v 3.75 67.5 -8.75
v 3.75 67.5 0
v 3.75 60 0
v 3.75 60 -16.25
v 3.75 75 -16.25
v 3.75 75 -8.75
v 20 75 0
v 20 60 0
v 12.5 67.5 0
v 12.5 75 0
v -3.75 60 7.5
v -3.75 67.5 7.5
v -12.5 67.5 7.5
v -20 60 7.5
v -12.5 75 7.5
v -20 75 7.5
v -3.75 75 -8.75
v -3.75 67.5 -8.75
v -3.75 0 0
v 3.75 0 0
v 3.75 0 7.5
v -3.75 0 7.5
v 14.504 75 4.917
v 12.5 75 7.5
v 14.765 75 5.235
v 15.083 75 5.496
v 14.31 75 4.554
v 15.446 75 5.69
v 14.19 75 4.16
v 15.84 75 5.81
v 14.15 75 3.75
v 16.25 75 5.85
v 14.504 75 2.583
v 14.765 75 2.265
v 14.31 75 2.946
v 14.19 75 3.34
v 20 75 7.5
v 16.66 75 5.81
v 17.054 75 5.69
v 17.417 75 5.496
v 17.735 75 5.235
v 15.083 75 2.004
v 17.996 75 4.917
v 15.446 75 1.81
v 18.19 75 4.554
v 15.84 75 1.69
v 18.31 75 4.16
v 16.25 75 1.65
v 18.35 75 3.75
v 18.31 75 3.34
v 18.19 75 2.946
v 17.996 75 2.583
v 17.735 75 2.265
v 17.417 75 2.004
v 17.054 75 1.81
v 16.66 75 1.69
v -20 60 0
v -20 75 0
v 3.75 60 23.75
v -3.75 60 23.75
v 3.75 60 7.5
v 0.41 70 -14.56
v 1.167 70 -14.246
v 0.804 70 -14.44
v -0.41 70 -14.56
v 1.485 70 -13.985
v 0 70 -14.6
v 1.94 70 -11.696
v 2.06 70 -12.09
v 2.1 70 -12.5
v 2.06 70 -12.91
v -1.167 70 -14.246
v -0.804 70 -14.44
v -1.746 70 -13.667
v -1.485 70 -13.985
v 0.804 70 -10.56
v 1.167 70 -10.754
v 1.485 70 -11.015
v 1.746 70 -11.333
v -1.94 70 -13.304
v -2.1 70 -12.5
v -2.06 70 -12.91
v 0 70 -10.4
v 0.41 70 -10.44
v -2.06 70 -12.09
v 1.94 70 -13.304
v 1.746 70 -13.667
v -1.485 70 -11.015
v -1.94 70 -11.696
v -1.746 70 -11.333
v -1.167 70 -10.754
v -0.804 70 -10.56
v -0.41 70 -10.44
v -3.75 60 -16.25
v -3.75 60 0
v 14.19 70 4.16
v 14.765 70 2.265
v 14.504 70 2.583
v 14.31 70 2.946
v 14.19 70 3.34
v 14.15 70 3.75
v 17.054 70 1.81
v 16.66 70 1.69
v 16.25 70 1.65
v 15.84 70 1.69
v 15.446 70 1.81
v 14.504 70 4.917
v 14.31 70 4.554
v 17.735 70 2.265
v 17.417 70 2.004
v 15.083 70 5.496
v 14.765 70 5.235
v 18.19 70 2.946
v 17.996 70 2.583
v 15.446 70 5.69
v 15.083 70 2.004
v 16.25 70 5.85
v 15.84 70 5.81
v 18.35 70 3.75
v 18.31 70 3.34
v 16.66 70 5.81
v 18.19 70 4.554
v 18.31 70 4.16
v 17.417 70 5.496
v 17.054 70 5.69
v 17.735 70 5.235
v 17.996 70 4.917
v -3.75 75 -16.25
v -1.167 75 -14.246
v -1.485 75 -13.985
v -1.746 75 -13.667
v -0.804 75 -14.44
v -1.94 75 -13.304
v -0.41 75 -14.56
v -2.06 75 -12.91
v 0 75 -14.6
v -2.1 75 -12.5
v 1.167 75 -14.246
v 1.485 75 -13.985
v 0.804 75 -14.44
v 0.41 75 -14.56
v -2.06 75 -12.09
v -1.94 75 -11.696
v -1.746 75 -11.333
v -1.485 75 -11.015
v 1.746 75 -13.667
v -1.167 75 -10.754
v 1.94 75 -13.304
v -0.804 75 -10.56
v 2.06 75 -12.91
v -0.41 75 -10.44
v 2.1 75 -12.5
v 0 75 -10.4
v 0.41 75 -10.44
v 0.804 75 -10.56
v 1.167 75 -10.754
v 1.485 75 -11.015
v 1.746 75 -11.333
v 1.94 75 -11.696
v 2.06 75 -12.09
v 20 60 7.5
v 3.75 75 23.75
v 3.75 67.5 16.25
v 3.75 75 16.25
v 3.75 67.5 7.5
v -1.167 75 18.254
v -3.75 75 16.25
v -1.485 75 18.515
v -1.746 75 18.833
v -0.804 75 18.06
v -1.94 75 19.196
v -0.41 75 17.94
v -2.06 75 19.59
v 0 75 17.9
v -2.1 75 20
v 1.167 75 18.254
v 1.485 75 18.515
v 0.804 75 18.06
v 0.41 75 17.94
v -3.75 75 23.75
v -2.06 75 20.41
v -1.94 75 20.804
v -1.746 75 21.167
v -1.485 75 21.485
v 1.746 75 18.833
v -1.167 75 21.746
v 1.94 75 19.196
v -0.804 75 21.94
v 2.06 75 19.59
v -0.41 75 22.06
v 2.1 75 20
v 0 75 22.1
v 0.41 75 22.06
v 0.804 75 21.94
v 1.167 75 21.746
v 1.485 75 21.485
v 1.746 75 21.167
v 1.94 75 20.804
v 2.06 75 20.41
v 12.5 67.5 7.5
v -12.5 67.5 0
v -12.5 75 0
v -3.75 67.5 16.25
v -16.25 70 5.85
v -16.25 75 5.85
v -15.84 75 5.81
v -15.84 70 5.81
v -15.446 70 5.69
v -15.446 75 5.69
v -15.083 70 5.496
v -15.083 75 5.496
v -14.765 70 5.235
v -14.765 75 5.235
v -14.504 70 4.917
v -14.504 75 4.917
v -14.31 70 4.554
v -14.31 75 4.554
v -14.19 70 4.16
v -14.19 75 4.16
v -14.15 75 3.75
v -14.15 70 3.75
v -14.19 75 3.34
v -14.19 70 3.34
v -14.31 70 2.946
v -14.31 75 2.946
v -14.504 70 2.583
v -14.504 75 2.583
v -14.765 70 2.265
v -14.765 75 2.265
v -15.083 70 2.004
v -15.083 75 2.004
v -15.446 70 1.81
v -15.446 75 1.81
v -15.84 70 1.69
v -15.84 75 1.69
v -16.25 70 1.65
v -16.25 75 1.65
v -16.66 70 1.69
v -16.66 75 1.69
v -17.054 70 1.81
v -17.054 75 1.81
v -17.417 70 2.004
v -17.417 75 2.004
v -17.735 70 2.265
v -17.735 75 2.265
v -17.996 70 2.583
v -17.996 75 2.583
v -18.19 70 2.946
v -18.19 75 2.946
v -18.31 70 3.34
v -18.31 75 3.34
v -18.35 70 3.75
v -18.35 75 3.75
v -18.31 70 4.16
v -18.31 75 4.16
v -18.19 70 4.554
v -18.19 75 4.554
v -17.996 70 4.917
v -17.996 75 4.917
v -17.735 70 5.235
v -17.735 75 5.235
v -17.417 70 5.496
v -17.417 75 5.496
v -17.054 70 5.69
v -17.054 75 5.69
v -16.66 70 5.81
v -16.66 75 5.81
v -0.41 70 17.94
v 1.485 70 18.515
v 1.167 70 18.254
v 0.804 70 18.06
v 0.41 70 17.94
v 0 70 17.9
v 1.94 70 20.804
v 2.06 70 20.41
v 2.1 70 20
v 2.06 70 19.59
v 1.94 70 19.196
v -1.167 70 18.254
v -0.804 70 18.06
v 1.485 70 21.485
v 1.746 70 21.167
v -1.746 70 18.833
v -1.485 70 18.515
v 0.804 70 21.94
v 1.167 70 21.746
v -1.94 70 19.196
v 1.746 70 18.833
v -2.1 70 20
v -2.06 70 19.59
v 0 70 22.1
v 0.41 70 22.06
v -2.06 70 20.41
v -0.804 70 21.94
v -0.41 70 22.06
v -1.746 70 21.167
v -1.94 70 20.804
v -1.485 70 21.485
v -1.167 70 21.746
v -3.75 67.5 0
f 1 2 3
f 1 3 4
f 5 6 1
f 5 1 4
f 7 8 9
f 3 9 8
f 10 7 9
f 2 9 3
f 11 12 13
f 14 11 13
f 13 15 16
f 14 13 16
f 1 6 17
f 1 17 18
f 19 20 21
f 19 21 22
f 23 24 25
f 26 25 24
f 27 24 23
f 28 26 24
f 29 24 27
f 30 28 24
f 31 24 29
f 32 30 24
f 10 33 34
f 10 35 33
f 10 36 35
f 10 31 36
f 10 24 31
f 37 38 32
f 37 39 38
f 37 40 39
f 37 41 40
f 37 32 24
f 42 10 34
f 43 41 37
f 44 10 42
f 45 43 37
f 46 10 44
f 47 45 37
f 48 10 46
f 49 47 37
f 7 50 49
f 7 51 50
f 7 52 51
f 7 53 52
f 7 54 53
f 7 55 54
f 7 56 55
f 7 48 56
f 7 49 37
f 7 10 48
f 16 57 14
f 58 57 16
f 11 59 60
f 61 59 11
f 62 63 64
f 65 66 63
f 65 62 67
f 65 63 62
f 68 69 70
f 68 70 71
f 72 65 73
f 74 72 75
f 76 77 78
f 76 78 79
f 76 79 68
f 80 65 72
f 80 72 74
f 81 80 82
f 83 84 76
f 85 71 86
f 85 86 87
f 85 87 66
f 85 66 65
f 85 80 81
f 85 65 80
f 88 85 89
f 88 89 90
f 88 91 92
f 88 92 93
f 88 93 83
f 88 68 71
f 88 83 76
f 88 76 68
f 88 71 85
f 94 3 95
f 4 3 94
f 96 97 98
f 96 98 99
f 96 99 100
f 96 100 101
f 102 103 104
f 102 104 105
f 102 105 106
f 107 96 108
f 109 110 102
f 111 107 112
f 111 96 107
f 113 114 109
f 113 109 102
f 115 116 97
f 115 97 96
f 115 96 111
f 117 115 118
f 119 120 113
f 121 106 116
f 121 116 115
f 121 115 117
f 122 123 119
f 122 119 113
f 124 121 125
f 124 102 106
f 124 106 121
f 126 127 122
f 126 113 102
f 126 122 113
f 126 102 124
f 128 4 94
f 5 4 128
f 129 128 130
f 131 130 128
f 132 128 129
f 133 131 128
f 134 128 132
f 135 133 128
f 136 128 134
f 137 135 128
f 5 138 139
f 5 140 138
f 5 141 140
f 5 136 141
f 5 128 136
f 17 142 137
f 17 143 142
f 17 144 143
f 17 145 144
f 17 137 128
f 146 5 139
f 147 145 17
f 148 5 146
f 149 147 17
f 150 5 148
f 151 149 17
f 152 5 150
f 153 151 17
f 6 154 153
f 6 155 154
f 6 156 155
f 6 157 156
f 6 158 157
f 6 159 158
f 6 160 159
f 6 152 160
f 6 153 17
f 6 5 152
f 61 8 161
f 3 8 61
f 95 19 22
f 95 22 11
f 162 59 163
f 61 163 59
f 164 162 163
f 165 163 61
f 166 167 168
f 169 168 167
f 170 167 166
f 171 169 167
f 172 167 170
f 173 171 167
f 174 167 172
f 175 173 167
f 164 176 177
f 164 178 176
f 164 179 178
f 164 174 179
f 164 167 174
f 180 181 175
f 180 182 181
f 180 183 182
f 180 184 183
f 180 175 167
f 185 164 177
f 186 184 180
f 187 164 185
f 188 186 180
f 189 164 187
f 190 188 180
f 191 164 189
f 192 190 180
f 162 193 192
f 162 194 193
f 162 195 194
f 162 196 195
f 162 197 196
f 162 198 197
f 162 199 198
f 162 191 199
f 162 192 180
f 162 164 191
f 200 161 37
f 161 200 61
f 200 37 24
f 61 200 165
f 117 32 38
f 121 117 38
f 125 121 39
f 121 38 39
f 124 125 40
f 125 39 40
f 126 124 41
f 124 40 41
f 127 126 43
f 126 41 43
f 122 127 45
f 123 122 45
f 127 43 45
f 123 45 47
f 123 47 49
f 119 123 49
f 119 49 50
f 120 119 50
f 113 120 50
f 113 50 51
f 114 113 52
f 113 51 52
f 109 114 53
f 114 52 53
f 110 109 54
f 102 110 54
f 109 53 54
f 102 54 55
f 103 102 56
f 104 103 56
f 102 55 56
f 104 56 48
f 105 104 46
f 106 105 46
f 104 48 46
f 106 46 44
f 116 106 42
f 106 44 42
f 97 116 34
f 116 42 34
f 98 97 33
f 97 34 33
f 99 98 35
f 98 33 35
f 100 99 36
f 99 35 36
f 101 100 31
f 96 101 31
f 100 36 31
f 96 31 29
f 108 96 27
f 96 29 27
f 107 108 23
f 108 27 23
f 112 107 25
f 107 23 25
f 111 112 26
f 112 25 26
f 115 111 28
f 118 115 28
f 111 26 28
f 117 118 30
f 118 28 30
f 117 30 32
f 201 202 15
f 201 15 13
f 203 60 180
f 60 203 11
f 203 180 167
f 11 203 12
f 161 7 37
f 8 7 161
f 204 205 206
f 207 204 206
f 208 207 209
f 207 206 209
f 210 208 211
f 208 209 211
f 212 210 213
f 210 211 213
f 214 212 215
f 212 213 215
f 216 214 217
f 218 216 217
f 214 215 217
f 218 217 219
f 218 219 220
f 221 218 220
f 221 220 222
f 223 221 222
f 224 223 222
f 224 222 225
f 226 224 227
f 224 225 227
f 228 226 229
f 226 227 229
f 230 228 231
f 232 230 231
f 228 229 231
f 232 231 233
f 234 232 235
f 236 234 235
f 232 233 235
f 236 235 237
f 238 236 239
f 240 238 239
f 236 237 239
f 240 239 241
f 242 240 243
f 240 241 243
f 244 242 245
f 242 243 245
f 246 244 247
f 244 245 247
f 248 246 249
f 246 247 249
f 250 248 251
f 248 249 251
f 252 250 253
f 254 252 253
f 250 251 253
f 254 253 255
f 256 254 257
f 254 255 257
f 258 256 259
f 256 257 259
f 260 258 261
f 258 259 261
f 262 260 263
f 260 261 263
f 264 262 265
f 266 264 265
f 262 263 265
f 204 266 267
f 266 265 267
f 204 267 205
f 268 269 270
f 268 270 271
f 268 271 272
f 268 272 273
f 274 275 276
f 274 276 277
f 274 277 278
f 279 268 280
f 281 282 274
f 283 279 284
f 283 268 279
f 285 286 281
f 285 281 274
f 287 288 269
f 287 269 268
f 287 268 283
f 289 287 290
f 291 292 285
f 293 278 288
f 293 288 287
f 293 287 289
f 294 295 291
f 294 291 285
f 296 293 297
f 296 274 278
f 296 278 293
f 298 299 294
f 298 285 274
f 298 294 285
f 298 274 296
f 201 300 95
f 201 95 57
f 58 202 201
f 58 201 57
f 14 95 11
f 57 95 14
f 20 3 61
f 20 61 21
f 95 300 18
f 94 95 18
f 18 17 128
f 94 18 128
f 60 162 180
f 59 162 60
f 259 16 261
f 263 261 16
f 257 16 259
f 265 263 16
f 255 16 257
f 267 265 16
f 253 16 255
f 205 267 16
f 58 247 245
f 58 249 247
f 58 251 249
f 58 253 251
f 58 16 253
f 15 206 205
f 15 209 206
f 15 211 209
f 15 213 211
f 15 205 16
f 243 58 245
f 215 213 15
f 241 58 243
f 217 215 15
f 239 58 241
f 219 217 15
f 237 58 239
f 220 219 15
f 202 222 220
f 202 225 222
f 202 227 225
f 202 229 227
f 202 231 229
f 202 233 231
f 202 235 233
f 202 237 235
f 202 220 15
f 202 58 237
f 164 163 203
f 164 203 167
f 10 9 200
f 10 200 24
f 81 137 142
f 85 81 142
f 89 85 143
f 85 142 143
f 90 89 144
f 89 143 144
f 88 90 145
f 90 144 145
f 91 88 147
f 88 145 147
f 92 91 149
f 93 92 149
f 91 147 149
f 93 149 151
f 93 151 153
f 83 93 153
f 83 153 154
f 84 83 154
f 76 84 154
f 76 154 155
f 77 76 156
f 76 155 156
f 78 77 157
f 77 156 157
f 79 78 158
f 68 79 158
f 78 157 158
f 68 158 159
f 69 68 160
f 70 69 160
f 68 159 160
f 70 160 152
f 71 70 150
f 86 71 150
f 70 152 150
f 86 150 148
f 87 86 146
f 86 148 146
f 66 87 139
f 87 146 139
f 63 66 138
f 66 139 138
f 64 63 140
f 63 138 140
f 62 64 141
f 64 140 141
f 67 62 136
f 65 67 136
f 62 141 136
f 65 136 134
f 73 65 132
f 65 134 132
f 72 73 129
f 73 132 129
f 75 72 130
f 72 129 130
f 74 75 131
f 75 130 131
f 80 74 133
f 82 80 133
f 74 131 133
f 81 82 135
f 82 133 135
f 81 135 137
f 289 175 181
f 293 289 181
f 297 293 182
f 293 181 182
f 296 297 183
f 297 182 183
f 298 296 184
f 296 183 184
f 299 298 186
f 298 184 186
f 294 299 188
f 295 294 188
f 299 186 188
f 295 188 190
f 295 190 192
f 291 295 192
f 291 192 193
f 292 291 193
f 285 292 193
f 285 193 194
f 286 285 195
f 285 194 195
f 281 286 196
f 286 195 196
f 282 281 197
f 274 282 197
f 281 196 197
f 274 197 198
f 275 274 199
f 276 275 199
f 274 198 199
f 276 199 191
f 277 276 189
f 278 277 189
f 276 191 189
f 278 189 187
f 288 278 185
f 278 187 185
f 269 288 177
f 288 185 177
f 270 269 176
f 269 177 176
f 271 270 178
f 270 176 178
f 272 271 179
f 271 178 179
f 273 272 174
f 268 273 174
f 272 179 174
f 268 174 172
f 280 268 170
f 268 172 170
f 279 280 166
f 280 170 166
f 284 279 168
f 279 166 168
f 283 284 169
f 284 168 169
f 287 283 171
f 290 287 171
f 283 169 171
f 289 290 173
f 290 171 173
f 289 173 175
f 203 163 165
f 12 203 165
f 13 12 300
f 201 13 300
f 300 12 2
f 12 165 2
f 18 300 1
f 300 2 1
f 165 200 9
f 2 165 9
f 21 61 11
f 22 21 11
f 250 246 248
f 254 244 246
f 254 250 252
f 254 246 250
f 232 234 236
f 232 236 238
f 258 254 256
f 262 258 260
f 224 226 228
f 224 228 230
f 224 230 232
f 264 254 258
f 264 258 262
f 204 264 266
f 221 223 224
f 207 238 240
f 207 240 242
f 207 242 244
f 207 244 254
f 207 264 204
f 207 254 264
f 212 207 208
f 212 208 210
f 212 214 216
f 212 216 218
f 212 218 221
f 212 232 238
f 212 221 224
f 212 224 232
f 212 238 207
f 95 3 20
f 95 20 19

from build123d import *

# Parameters (mm, degrees)
BOSS_EXTRUDE1_DEPTH = 7.5
SKETCH3_R           = 2.1
CUT_EXTRUDE1_DEPTH  = 5
CIRPATTERN1_COUNT   = 2
CIRPATTERN1_ANGLE   = 90


with BuildPart() as part:
    # Sketch1 → Boss-Extrude1 (new body)
    with BuildSketch(Plane.XY):
        Polygon((12.5, 75), (20, 75), (20, 60), (3.75, 60), (3.75, 0), (-3.75, 0), (-3.75, 60), (-20, 60), (-20, 75), (-12.5, 75), (-12.5, 67.5), (0, 67.5), (12.5, 67.5), align=None)
    extrude(amount=BOSS_EXTRUDE1_DEPTH)

    # Sketch3 → Cut-Extrude1 (cut)
    with BuildSketch(Plane(origin=(0, 75, 0), x_dir=(1, 0, 0), z_dir=(0, 1, 0))):
        with Locations(Location((-16.25, -3.75, 0), (0, 0, 270))):
            Circle(SKETCH3_R)
        with Locations(Location((16.25, -3.75, 0), (0, 0, 270))):
            Circle(SKETCH3_R)
    extrude(amount=-CUT_EXTRUDE1_DEPTH, mode=Mode.SUBTRACT)


with BuildPart() as cirpattern1_1:
    # CirPattern1: pattern copy
    add(part.part.rotate(Axis((0, 0, 3.75), (0, -1, 0)), 1 * CIRPATTERN1_ANGLE / (CIRPATTERN1_COUNT - 1)))


with BuildPart() as part_1:
    add(part.part)

    # Combine1: union CirPattern1_1
    add(cirpattern1_1.part)


solid = part_1.part
